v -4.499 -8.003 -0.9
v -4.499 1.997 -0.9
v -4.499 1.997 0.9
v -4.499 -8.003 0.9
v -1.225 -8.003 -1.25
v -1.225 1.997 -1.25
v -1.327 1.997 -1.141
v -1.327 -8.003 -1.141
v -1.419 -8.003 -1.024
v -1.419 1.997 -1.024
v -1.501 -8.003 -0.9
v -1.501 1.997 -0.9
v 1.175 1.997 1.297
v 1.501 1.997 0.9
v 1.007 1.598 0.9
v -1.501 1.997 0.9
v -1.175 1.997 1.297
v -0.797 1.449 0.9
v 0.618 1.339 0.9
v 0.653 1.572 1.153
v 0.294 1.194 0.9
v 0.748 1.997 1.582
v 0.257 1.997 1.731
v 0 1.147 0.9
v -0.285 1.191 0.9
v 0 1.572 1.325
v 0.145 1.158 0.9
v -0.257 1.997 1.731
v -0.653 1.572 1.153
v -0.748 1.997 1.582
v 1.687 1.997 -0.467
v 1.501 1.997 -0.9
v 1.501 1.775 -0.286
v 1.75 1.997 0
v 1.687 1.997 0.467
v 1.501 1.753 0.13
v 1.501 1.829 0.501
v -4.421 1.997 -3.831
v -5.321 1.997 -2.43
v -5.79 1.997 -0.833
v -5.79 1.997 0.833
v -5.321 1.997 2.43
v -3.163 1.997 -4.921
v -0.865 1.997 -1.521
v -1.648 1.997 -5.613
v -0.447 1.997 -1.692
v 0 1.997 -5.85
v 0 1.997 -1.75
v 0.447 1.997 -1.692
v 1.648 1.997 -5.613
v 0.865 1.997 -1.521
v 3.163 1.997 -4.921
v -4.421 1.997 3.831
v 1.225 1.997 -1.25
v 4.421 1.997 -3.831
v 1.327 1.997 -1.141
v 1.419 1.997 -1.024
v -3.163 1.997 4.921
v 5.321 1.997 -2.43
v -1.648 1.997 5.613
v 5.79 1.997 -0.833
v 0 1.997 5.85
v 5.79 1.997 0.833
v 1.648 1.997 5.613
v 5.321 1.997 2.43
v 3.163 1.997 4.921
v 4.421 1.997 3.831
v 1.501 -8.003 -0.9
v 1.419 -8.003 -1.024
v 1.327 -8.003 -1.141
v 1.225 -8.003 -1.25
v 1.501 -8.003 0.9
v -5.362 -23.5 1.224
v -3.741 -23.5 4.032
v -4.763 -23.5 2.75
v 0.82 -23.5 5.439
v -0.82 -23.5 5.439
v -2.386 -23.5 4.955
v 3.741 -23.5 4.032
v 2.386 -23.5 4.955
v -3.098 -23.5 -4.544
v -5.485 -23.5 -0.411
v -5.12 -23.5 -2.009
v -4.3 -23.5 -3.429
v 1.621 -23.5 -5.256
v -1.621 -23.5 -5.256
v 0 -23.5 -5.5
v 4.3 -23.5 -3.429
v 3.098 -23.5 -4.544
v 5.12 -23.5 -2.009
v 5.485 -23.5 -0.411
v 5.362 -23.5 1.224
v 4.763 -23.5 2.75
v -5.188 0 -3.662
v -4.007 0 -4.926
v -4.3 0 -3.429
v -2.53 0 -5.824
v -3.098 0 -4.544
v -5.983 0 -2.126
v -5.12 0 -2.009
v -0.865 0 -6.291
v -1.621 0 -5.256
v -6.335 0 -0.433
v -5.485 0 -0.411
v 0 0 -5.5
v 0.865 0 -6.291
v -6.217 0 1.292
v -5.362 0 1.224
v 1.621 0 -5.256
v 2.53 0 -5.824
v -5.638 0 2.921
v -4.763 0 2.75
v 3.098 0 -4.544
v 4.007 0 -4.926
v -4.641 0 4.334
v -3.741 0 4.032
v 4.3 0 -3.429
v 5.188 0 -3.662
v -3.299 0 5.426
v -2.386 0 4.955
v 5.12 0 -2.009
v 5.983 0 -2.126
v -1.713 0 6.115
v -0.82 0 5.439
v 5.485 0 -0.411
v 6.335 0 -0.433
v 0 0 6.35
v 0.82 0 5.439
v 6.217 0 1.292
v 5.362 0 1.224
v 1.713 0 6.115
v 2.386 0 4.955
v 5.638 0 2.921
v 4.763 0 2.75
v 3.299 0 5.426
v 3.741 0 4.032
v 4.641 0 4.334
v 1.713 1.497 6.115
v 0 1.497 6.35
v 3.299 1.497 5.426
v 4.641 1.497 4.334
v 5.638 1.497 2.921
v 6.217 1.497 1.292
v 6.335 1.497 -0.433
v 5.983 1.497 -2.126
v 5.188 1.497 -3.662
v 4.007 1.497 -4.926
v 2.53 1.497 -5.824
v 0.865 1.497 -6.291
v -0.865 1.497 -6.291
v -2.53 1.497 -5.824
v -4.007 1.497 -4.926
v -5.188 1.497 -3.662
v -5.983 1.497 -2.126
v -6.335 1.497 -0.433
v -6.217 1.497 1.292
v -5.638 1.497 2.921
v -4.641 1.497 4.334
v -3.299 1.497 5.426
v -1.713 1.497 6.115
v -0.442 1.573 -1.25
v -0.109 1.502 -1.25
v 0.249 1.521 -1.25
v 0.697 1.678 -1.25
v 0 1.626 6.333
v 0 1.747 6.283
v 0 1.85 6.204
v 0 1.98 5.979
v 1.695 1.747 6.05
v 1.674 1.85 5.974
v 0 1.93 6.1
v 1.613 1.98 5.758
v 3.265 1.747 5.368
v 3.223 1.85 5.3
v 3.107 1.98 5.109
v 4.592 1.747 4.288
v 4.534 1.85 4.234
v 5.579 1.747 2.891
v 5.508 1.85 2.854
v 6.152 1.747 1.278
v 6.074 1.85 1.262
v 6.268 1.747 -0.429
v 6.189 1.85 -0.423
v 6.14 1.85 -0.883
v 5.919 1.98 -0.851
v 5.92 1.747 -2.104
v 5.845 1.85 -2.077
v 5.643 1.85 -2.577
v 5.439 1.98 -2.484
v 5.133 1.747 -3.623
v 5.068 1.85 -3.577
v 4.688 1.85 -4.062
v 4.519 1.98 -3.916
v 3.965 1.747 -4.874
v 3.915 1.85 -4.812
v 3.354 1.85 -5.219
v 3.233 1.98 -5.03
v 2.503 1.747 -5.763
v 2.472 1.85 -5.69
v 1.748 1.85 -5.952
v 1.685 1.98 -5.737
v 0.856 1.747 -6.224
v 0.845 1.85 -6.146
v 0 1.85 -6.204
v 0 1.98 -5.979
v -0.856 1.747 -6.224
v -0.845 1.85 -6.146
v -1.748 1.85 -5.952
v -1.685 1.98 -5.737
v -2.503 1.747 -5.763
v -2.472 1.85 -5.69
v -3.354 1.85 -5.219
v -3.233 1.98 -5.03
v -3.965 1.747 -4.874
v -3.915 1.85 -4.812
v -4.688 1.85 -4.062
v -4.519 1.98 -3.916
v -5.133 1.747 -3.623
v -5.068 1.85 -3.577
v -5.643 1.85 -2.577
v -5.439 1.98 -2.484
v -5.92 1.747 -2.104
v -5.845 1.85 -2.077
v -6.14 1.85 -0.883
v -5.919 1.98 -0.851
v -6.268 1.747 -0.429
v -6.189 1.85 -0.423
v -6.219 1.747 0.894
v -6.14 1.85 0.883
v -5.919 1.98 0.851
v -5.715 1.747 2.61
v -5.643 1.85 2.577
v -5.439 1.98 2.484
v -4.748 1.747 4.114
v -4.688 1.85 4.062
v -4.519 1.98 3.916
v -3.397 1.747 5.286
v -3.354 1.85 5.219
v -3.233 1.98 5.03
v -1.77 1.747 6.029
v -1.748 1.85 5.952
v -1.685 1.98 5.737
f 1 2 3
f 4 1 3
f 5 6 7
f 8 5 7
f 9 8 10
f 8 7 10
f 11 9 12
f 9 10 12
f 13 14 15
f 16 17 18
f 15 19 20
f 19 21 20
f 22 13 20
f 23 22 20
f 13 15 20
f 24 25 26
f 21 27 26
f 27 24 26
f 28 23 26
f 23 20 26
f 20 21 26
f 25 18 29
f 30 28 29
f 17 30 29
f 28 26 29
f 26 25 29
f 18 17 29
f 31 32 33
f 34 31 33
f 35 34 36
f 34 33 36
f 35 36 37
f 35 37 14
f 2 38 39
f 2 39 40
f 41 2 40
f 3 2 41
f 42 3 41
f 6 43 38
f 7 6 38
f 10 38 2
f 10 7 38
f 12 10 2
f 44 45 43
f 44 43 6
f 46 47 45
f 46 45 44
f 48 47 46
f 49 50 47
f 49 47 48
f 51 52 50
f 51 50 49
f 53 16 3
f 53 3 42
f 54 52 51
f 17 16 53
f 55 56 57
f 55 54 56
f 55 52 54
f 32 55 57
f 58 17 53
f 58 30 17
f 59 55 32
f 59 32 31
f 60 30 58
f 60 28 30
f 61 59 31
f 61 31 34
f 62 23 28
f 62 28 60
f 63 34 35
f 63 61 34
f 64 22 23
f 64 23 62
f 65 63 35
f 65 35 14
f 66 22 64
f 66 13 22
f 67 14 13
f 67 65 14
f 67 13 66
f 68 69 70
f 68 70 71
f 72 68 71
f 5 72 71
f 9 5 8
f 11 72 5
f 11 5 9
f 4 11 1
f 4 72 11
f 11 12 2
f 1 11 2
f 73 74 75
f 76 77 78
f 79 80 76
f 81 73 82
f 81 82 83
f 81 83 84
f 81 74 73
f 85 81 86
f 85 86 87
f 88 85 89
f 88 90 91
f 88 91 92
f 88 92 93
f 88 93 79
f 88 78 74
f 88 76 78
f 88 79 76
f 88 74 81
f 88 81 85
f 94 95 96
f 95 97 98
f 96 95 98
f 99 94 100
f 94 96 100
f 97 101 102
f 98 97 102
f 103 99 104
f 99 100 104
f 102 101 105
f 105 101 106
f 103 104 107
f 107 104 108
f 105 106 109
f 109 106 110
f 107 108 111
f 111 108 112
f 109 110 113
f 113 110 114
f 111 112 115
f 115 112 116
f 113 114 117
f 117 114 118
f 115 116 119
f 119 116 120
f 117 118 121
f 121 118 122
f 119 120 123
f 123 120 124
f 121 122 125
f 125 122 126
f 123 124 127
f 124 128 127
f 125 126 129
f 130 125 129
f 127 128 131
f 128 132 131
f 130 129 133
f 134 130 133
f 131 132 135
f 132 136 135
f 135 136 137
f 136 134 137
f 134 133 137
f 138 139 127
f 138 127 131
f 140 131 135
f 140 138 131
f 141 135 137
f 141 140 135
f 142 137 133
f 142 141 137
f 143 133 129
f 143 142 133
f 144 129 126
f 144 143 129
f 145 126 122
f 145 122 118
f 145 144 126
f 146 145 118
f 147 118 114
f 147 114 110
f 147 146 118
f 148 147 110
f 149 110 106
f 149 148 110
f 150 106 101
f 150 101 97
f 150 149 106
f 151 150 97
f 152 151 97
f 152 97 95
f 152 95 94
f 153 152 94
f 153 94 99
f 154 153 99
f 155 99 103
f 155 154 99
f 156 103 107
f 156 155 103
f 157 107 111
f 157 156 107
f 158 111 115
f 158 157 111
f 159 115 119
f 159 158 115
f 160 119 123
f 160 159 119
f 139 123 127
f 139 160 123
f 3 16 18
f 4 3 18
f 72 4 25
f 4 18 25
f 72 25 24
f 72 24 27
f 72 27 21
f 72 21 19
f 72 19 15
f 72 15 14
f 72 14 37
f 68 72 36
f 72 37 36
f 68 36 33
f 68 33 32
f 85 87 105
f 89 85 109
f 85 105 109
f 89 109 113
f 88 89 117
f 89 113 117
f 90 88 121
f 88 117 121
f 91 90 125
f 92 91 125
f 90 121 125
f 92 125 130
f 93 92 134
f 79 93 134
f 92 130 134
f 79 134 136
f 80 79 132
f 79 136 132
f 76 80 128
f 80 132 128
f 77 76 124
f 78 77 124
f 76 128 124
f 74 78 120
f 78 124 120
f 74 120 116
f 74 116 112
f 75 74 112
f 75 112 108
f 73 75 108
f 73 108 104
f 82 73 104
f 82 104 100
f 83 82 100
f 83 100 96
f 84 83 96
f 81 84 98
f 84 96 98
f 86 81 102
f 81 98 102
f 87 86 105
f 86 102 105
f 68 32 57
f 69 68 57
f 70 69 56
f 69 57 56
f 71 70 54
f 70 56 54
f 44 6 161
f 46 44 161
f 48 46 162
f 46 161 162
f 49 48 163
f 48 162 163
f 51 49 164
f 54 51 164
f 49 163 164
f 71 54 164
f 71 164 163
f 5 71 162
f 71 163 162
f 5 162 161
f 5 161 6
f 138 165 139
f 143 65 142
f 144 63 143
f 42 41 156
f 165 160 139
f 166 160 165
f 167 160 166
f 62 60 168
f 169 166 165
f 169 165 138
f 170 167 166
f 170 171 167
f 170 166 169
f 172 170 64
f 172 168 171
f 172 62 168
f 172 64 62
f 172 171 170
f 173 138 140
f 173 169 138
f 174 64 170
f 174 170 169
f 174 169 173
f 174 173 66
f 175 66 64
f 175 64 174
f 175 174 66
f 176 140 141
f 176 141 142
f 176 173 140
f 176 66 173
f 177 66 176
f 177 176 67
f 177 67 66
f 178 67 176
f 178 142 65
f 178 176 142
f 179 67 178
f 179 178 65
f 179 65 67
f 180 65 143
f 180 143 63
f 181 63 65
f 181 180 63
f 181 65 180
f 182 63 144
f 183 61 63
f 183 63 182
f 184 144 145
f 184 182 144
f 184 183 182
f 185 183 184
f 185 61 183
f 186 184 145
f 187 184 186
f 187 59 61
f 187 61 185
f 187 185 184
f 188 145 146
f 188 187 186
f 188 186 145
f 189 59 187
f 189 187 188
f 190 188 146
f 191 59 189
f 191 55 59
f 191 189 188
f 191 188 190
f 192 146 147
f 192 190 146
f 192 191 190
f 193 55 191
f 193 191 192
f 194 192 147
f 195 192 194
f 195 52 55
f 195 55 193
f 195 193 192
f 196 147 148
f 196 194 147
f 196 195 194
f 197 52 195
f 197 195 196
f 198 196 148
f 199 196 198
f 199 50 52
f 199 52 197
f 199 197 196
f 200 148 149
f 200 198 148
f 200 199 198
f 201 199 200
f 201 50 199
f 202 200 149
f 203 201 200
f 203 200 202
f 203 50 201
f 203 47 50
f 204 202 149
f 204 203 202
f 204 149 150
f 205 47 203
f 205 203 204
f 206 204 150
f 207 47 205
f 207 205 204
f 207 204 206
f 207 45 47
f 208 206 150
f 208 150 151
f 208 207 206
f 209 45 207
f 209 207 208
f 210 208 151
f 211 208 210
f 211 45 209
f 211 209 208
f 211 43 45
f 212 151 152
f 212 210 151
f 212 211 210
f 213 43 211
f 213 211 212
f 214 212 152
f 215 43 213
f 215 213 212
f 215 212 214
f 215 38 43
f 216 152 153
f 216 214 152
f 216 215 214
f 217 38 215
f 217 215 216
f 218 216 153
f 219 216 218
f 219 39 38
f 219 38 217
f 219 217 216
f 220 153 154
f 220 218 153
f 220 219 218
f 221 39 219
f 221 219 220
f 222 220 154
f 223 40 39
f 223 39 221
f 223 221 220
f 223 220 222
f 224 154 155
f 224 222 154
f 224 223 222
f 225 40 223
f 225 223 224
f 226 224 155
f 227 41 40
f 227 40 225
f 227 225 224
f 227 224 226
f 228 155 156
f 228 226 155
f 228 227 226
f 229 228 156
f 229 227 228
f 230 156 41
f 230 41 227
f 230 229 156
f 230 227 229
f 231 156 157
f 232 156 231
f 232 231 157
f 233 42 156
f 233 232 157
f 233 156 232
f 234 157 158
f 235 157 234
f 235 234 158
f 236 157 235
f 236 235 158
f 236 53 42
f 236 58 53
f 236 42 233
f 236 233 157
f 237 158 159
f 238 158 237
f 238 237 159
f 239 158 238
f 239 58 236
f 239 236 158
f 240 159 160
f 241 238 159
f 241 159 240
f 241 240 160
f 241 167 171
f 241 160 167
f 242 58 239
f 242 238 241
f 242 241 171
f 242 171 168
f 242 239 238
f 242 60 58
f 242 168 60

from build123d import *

# Parameters (mm, degrees)
SKETCH1_W           = 6.35
SKETCH1_H           = 1.996855346
SKETCH2_R           = 5.5
BOSS_EXTRUDE1_DEPTH = 23.5
CUT_EXTRUDE1_DEPTH  = 10
FILLET1_R           = 0.5


with BuildPart() as part:
    # Sketch1 → Revolve1 (revolve)
    with BuildSketch(Plane(origin=(0, 0, 0), x_dir=(-1, 0, 0), z_dir=(0, 0, -1))):
        with Locations((-3.175, 0.998427673)):
            Rectangle(SKETCH1_W, SKETCH1_H)
    revolve(axis=Axis((0, 0, 0), (0, 1, 0)))

    # Sketch2 → Boss-Extrude1 (add)
    with BuildSketch(Plane.XZ):
        Circle(SKETCH2_R)
    extrude(amount=BOSS_EXTRUDE1_DEPTH)

    # Sketch3 → Cut-Extrude1 (cut)
    with BuildSketch(Plane(origin=(0, 1.996855346, 0), x_dir=(-1, 0, 0), z_dir=(0, 1, 0))):
        with BuildLine():
            Line((4.499166898, 0.9), (-1.500833102, 0.9))
            Line((-1.500833102, 0.9), (-1.500833102, -0.9))
            ThreePointArc((-1.500833102, -0.9), (-1.373979193, -1.083827098), (-1.224744871, -1.25))
            Line((-1.224744871, -1.25), (1.224744871, -1.25))
            ThreePointArc((1.224744871, -1.25), (1.373979193, -1.083827098), (1.500833102, -0.9))
            Line((1.500833102, -0.9), (4.499166898, -0.9))
            Line((4.499166898, -0.9), (4.499166898, 0.9))
        make_face()
    extrude(amount=-CUT_EXTRUDE1_DEPTH, mode=Mode.SUBTRACT)

    # Fillet1
    fillet1_edges = [part.edges().sort_by_distance(p)[0] for p in [
        (-6.35, 1.996855346, 0),
    ]]
    fillet(fillet1_edges, radius=FILLET1_R)

    # Cut-Extrude2 cone 1 section (through the dimple's axis) → Cut-Extrude2 (revolve, cut)
    with BuildSketch(Plane(origin=(0, 1.996855346, 0), x_dir=(0, 0, 1), z_dir=(1, 0, 0))):
        Polygon((0, 0), (1.75, 0), (0, 1.75), align=None)
    revolve(axis=Axis((0, 1.996855346, 0), (0, -1, 0)), mode=Mode.SUBTRACT)


solid = part.part
